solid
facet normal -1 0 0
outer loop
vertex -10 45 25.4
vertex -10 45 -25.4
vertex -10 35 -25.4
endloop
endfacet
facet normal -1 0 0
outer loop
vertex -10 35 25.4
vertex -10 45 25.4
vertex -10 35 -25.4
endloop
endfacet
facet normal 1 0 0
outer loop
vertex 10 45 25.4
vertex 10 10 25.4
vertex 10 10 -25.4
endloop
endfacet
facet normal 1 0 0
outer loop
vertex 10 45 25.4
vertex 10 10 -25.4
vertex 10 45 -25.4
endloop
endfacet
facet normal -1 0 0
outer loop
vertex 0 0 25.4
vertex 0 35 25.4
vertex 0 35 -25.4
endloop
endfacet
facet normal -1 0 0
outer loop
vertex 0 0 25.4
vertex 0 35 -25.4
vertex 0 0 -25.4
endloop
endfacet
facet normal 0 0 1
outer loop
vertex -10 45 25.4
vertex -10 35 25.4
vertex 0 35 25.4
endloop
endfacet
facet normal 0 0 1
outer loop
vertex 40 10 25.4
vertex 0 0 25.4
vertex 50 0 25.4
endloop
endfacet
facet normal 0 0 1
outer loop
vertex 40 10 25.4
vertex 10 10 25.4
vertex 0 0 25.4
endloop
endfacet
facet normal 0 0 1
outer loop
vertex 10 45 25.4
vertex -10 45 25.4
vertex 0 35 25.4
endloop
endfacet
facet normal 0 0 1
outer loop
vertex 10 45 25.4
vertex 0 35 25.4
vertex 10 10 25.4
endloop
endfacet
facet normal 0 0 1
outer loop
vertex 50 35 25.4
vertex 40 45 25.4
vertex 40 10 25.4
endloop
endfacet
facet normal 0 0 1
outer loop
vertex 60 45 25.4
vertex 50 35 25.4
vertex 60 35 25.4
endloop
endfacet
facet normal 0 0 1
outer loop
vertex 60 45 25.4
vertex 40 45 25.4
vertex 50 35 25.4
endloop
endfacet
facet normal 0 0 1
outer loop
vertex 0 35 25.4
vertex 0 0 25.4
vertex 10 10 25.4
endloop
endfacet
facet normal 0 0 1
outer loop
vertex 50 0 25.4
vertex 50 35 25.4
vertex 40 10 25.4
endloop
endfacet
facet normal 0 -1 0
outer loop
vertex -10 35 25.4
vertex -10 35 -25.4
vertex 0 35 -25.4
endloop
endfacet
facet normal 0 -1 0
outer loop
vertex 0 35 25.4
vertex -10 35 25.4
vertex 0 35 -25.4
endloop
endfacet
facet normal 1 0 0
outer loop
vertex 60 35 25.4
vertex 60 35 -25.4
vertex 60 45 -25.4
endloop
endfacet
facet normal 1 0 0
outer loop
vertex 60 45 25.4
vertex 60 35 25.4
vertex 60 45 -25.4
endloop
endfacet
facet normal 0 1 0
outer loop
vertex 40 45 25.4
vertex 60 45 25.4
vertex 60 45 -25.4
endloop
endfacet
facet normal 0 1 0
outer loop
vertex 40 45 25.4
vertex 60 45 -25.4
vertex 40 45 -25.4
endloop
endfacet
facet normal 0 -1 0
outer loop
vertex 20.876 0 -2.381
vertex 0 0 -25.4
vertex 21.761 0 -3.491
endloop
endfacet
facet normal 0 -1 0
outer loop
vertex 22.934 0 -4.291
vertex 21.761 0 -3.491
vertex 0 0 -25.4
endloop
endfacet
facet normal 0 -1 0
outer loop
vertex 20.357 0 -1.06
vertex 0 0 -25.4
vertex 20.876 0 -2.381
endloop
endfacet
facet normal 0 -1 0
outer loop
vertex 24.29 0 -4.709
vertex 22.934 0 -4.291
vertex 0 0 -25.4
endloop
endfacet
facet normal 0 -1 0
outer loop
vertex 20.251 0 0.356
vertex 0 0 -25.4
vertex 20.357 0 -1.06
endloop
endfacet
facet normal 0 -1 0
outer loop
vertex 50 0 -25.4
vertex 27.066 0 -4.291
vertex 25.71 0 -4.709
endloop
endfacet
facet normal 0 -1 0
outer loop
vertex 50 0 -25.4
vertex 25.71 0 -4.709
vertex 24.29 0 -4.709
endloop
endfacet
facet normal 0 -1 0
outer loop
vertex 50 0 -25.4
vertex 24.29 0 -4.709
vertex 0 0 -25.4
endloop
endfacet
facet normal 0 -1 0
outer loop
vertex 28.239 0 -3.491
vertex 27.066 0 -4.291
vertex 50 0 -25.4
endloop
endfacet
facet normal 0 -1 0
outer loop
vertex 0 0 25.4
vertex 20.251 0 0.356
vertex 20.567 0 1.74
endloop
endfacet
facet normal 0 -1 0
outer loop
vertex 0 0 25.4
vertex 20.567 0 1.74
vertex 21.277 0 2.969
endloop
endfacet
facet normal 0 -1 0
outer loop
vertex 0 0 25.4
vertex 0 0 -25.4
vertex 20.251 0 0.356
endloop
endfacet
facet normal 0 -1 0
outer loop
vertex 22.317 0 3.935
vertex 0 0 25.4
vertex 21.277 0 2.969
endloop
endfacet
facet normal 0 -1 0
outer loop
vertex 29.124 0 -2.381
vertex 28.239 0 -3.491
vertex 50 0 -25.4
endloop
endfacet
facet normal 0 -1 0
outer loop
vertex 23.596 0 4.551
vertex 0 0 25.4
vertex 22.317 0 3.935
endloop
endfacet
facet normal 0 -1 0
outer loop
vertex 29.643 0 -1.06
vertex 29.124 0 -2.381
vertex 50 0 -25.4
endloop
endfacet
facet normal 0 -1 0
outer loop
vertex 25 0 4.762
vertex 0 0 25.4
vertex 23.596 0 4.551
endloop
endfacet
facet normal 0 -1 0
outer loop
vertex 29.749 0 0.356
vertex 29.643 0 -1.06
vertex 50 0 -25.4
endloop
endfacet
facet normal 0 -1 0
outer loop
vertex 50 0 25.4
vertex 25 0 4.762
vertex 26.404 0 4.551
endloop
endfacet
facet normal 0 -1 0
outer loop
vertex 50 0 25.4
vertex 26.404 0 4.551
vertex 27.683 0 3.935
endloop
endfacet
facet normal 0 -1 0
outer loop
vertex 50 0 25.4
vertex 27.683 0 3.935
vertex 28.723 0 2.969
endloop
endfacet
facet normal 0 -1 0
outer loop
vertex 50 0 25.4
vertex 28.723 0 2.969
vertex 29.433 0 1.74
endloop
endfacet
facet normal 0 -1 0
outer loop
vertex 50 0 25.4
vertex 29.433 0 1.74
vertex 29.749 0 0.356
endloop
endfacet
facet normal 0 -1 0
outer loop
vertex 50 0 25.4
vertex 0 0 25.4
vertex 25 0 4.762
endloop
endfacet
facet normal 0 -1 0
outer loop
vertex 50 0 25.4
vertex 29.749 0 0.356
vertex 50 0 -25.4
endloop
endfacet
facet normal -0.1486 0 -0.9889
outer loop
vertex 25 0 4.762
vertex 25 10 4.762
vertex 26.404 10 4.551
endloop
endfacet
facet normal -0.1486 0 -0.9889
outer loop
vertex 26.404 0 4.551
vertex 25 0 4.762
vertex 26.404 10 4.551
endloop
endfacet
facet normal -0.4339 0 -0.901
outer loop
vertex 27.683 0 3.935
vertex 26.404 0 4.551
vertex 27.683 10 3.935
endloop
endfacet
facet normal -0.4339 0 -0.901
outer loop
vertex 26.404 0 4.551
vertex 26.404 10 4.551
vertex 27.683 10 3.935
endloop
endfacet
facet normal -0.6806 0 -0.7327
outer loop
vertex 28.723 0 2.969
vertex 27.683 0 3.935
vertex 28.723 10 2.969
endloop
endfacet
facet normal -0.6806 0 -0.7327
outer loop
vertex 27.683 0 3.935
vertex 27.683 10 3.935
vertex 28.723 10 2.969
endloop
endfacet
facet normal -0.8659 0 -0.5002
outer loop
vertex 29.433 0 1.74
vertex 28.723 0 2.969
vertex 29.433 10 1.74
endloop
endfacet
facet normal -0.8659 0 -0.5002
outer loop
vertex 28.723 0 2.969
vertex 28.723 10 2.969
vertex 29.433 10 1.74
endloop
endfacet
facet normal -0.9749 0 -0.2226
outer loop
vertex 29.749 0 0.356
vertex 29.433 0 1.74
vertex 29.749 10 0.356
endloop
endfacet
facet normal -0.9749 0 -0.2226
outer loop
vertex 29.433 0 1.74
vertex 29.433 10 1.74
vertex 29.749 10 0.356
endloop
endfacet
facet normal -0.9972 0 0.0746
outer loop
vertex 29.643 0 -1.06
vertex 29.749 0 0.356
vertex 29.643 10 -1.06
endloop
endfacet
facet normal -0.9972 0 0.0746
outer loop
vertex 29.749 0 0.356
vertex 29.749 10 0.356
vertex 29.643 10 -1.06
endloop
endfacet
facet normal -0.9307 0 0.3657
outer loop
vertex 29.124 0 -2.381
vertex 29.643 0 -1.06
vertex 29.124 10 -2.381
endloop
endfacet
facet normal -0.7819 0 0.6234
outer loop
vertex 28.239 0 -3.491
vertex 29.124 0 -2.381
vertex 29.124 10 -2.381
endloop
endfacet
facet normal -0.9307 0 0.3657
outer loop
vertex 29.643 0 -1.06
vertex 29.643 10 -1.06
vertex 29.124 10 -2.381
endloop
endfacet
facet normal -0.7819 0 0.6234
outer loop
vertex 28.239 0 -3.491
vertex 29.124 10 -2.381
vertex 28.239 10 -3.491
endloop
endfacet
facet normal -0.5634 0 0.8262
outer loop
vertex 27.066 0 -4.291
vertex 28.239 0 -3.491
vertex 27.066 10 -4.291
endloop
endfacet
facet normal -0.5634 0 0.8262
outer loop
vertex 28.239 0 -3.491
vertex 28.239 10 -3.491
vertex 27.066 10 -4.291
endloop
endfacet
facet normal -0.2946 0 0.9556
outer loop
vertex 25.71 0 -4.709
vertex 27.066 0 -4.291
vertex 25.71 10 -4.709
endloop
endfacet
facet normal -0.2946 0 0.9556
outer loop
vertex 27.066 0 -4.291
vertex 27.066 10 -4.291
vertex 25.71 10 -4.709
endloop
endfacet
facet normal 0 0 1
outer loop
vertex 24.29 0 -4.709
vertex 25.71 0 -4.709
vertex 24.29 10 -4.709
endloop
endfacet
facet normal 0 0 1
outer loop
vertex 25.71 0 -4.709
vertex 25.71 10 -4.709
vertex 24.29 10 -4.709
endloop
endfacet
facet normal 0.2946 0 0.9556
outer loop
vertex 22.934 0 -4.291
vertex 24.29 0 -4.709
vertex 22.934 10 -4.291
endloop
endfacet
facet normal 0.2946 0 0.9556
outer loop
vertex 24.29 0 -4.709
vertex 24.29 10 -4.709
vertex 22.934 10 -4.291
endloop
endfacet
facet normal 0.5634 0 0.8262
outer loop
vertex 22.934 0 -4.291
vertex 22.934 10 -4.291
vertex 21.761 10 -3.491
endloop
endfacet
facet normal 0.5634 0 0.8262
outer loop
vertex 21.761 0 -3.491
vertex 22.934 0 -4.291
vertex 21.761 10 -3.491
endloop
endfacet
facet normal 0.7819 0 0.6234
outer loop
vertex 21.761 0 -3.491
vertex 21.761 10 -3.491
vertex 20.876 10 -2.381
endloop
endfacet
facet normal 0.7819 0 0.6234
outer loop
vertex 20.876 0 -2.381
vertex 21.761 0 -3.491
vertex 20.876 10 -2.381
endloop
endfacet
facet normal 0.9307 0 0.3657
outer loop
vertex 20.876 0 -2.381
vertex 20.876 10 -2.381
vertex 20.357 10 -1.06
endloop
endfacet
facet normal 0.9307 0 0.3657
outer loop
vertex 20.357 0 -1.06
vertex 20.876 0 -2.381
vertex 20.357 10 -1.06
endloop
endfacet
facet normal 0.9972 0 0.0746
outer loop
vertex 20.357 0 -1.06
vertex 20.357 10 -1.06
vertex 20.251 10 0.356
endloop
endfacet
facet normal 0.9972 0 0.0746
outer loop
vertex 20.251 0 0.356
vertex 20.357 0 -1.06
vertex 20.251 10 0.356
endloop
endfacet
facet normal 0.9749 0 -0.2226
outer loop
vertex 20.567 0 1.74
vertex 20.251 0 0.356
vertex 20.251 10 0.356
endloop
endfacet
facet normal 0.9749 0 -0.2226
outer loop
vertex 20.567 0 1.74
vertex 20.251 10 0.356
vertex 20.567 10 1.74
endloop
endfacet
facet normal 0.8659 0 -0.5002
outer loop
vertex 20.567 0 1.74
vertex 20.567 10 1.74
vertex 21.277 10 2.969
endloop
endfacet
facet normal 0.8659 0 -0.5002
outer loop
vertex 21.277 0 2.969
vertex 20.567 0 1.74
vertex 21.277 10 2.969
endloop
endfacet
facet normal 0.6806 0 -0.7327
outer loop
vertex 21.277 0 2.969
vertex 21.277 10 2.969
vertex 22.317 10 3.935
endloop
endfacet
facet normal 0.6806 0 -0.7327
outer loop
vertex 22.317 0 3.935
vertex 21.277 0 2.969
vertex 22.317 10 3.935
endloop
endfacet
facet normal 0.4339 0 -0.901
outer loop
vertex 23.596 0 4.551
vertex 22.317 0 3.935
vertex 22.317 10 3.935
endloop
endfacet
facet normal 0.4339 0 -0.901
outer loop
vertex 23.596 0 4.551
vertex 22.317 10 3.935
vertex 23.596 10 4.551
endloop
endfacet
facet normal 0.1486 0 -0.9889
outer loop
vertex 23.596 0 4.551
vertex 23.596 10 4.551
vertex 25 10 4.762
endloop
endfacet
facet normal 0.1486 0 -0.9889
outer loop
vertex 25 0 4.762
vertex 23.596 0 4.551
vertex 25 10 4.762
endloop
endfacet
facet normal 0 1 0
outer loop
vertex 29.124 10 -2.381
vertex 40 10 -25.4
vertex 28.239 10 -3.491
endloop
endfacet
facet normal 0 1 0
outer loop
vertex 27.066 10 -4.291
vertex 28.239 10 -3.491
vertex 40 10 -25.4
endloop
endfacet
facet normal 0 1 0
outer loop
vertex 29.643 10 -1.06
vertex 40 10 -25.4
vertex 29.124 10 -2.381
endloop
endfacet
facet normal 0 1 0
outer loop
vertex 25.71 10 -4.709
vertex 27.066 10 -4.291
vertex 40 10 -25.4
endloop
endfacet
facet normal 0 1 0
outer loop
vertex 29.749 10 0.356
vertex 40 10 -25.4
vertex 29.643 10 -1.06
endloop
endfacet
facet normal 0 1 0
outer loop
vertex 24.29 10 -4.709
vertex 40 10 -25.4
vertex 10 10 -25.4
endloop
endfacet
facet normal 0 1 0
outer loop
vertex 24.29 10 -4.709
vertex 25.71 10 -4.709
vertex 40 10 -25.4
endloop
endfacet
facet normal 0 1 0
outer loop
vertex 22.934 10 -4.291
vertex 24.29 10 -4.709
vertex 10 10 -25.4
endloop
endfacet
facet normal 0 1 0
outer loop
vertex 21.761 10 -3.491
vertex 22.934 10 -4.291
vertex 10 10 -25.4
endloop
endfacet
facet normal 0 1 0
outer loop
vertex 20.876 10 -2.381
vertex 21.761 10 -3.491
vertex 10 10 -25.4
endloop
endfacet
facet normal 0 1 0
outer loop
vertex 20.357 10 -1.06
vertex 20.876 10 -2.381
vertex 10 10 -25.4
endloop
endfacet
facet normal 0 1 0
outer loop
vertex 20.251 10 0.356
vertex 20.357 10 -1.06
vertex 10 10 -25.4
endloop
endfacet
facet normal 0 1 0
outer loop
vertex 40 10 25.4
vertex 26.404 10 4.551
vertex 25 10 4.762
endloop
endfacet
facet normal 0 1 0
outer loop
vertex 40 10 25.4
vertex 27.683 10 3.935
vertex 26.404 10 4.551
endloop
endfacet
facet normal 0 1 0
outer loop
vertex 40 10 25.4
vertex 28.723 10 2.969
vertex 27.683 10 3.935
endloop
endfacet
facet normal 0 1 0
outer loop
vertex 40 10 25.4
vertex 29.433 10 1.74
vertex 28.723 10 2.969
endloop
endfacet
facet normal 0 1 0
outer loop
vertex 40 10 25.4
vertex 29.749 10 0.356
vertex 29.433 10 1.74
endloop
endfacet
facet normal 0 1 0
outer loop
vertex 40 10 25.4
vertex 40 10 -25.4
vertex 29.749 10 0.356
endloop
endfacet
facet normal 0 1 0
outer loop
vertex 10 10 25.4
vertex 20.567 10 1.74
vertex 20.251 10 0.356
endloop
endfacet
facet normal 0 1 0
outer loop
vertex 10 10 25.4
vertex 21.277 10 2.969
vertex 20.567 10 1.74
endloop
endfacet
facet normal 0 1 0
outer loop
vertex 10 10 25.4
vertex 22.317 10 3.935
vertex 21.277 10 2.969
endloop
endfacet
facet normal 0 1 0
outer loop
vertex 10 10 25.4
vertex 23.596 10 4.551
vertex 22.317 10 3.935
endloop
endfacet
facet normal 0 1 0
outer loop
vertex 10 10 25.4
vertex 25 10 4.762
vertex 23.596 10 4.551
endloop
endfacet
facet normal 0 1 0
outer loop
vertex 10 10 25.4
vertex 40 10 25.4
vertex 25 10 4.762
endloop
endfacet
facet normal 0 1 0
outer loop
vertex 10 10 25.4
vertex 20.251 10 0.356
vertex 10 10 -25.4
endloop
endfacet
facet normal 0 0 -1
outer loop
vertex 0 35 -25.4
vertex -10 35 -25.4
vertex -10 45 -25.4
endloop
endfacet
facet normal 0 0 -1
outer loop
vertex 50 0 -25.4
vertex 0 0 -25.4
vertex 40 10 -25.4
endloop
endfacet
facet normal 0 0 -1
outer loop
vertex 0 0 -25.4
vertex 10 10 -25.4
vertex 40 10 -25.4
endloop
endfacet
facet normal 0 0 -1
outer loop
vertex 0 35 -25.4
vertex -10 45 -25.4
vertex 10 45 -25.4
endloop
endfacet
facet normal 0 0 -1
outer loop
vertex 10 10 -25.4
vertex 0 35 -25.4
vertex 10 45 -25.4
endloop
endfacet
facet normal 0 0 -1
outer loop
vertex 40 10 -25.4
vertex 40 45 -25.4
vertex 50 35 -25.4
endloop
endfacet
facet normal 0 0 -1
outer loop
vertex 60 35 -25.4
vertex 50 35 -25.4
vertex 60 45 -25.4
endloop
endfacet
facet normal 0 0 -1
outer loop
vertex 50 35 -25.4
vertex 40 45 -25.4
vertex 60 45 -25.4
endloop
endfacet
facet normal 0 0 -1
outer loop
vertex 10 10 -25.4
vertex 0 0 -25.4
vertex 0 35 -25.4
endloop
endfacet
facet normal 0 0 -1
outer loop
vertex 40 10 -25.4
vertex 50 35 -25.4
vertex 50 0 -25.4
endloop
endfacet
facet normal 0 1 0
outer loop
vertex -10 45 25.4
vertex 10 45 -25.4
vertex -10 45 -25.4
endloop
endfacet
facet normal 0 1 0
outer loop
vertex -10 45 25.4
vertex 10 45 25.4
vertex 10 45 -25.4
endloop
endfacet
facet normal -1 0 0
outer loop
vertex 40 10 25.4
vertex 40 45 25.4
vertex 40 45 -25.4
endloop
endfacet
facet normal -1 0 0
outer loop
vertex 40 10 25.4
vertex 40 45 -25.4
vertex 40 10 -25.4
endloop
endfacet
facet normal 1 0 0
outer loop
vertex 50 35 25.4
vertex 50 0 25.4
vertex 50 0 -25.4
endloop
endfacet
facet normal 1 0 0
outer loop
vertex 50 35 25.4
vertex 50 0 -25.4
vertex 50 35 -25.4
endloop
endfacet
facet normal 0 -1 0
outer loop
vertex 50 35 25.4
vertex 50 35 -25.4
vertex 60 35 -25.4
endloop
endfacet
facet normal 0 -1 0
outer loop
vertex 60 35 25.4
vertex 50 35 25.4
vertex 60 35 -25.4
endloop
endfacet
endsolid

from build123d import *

# Parameters (mm, degrees)
EXTRUIR_L_MINA1_DEPTH = 25.4
CROQUIS2_R            = 4.7625
CORTAR_EXTRUIR1_DEPTH = 74.960530014


with BuildPart() as part:
    # Croquis1 → Extruir-Lámina1 (new, symmetric)
    with BuildSketch(Plane.XY):
        Polygon((-10, 35), (0, 35), (0, 0), (50, 0), (50, 35), (60, 35), (60, 45), (40, 45), (40, 10), (10, 10), (10, 45), (-10, 45), align=None)
    extrude(amount=EXTRUIR_L_MINA1_DEPTH, both=True)

    # Croquis2 → Cortar-Extruir1 (cut, through all)
    with BuildSketch(Plane(origin=(0, 10, 0), x_dir=(1, 0, 0), z_dir=(0, 1, 0))):
        with Locations(Location((25, 0, 0), (0, 0, 270))):
            Circle(CROQUIS2_R)
    extrude(amount=-CORTAR_EXTRUIR1_DEPTH, mode=Mode.SUBTRACT)


solid = part.part
